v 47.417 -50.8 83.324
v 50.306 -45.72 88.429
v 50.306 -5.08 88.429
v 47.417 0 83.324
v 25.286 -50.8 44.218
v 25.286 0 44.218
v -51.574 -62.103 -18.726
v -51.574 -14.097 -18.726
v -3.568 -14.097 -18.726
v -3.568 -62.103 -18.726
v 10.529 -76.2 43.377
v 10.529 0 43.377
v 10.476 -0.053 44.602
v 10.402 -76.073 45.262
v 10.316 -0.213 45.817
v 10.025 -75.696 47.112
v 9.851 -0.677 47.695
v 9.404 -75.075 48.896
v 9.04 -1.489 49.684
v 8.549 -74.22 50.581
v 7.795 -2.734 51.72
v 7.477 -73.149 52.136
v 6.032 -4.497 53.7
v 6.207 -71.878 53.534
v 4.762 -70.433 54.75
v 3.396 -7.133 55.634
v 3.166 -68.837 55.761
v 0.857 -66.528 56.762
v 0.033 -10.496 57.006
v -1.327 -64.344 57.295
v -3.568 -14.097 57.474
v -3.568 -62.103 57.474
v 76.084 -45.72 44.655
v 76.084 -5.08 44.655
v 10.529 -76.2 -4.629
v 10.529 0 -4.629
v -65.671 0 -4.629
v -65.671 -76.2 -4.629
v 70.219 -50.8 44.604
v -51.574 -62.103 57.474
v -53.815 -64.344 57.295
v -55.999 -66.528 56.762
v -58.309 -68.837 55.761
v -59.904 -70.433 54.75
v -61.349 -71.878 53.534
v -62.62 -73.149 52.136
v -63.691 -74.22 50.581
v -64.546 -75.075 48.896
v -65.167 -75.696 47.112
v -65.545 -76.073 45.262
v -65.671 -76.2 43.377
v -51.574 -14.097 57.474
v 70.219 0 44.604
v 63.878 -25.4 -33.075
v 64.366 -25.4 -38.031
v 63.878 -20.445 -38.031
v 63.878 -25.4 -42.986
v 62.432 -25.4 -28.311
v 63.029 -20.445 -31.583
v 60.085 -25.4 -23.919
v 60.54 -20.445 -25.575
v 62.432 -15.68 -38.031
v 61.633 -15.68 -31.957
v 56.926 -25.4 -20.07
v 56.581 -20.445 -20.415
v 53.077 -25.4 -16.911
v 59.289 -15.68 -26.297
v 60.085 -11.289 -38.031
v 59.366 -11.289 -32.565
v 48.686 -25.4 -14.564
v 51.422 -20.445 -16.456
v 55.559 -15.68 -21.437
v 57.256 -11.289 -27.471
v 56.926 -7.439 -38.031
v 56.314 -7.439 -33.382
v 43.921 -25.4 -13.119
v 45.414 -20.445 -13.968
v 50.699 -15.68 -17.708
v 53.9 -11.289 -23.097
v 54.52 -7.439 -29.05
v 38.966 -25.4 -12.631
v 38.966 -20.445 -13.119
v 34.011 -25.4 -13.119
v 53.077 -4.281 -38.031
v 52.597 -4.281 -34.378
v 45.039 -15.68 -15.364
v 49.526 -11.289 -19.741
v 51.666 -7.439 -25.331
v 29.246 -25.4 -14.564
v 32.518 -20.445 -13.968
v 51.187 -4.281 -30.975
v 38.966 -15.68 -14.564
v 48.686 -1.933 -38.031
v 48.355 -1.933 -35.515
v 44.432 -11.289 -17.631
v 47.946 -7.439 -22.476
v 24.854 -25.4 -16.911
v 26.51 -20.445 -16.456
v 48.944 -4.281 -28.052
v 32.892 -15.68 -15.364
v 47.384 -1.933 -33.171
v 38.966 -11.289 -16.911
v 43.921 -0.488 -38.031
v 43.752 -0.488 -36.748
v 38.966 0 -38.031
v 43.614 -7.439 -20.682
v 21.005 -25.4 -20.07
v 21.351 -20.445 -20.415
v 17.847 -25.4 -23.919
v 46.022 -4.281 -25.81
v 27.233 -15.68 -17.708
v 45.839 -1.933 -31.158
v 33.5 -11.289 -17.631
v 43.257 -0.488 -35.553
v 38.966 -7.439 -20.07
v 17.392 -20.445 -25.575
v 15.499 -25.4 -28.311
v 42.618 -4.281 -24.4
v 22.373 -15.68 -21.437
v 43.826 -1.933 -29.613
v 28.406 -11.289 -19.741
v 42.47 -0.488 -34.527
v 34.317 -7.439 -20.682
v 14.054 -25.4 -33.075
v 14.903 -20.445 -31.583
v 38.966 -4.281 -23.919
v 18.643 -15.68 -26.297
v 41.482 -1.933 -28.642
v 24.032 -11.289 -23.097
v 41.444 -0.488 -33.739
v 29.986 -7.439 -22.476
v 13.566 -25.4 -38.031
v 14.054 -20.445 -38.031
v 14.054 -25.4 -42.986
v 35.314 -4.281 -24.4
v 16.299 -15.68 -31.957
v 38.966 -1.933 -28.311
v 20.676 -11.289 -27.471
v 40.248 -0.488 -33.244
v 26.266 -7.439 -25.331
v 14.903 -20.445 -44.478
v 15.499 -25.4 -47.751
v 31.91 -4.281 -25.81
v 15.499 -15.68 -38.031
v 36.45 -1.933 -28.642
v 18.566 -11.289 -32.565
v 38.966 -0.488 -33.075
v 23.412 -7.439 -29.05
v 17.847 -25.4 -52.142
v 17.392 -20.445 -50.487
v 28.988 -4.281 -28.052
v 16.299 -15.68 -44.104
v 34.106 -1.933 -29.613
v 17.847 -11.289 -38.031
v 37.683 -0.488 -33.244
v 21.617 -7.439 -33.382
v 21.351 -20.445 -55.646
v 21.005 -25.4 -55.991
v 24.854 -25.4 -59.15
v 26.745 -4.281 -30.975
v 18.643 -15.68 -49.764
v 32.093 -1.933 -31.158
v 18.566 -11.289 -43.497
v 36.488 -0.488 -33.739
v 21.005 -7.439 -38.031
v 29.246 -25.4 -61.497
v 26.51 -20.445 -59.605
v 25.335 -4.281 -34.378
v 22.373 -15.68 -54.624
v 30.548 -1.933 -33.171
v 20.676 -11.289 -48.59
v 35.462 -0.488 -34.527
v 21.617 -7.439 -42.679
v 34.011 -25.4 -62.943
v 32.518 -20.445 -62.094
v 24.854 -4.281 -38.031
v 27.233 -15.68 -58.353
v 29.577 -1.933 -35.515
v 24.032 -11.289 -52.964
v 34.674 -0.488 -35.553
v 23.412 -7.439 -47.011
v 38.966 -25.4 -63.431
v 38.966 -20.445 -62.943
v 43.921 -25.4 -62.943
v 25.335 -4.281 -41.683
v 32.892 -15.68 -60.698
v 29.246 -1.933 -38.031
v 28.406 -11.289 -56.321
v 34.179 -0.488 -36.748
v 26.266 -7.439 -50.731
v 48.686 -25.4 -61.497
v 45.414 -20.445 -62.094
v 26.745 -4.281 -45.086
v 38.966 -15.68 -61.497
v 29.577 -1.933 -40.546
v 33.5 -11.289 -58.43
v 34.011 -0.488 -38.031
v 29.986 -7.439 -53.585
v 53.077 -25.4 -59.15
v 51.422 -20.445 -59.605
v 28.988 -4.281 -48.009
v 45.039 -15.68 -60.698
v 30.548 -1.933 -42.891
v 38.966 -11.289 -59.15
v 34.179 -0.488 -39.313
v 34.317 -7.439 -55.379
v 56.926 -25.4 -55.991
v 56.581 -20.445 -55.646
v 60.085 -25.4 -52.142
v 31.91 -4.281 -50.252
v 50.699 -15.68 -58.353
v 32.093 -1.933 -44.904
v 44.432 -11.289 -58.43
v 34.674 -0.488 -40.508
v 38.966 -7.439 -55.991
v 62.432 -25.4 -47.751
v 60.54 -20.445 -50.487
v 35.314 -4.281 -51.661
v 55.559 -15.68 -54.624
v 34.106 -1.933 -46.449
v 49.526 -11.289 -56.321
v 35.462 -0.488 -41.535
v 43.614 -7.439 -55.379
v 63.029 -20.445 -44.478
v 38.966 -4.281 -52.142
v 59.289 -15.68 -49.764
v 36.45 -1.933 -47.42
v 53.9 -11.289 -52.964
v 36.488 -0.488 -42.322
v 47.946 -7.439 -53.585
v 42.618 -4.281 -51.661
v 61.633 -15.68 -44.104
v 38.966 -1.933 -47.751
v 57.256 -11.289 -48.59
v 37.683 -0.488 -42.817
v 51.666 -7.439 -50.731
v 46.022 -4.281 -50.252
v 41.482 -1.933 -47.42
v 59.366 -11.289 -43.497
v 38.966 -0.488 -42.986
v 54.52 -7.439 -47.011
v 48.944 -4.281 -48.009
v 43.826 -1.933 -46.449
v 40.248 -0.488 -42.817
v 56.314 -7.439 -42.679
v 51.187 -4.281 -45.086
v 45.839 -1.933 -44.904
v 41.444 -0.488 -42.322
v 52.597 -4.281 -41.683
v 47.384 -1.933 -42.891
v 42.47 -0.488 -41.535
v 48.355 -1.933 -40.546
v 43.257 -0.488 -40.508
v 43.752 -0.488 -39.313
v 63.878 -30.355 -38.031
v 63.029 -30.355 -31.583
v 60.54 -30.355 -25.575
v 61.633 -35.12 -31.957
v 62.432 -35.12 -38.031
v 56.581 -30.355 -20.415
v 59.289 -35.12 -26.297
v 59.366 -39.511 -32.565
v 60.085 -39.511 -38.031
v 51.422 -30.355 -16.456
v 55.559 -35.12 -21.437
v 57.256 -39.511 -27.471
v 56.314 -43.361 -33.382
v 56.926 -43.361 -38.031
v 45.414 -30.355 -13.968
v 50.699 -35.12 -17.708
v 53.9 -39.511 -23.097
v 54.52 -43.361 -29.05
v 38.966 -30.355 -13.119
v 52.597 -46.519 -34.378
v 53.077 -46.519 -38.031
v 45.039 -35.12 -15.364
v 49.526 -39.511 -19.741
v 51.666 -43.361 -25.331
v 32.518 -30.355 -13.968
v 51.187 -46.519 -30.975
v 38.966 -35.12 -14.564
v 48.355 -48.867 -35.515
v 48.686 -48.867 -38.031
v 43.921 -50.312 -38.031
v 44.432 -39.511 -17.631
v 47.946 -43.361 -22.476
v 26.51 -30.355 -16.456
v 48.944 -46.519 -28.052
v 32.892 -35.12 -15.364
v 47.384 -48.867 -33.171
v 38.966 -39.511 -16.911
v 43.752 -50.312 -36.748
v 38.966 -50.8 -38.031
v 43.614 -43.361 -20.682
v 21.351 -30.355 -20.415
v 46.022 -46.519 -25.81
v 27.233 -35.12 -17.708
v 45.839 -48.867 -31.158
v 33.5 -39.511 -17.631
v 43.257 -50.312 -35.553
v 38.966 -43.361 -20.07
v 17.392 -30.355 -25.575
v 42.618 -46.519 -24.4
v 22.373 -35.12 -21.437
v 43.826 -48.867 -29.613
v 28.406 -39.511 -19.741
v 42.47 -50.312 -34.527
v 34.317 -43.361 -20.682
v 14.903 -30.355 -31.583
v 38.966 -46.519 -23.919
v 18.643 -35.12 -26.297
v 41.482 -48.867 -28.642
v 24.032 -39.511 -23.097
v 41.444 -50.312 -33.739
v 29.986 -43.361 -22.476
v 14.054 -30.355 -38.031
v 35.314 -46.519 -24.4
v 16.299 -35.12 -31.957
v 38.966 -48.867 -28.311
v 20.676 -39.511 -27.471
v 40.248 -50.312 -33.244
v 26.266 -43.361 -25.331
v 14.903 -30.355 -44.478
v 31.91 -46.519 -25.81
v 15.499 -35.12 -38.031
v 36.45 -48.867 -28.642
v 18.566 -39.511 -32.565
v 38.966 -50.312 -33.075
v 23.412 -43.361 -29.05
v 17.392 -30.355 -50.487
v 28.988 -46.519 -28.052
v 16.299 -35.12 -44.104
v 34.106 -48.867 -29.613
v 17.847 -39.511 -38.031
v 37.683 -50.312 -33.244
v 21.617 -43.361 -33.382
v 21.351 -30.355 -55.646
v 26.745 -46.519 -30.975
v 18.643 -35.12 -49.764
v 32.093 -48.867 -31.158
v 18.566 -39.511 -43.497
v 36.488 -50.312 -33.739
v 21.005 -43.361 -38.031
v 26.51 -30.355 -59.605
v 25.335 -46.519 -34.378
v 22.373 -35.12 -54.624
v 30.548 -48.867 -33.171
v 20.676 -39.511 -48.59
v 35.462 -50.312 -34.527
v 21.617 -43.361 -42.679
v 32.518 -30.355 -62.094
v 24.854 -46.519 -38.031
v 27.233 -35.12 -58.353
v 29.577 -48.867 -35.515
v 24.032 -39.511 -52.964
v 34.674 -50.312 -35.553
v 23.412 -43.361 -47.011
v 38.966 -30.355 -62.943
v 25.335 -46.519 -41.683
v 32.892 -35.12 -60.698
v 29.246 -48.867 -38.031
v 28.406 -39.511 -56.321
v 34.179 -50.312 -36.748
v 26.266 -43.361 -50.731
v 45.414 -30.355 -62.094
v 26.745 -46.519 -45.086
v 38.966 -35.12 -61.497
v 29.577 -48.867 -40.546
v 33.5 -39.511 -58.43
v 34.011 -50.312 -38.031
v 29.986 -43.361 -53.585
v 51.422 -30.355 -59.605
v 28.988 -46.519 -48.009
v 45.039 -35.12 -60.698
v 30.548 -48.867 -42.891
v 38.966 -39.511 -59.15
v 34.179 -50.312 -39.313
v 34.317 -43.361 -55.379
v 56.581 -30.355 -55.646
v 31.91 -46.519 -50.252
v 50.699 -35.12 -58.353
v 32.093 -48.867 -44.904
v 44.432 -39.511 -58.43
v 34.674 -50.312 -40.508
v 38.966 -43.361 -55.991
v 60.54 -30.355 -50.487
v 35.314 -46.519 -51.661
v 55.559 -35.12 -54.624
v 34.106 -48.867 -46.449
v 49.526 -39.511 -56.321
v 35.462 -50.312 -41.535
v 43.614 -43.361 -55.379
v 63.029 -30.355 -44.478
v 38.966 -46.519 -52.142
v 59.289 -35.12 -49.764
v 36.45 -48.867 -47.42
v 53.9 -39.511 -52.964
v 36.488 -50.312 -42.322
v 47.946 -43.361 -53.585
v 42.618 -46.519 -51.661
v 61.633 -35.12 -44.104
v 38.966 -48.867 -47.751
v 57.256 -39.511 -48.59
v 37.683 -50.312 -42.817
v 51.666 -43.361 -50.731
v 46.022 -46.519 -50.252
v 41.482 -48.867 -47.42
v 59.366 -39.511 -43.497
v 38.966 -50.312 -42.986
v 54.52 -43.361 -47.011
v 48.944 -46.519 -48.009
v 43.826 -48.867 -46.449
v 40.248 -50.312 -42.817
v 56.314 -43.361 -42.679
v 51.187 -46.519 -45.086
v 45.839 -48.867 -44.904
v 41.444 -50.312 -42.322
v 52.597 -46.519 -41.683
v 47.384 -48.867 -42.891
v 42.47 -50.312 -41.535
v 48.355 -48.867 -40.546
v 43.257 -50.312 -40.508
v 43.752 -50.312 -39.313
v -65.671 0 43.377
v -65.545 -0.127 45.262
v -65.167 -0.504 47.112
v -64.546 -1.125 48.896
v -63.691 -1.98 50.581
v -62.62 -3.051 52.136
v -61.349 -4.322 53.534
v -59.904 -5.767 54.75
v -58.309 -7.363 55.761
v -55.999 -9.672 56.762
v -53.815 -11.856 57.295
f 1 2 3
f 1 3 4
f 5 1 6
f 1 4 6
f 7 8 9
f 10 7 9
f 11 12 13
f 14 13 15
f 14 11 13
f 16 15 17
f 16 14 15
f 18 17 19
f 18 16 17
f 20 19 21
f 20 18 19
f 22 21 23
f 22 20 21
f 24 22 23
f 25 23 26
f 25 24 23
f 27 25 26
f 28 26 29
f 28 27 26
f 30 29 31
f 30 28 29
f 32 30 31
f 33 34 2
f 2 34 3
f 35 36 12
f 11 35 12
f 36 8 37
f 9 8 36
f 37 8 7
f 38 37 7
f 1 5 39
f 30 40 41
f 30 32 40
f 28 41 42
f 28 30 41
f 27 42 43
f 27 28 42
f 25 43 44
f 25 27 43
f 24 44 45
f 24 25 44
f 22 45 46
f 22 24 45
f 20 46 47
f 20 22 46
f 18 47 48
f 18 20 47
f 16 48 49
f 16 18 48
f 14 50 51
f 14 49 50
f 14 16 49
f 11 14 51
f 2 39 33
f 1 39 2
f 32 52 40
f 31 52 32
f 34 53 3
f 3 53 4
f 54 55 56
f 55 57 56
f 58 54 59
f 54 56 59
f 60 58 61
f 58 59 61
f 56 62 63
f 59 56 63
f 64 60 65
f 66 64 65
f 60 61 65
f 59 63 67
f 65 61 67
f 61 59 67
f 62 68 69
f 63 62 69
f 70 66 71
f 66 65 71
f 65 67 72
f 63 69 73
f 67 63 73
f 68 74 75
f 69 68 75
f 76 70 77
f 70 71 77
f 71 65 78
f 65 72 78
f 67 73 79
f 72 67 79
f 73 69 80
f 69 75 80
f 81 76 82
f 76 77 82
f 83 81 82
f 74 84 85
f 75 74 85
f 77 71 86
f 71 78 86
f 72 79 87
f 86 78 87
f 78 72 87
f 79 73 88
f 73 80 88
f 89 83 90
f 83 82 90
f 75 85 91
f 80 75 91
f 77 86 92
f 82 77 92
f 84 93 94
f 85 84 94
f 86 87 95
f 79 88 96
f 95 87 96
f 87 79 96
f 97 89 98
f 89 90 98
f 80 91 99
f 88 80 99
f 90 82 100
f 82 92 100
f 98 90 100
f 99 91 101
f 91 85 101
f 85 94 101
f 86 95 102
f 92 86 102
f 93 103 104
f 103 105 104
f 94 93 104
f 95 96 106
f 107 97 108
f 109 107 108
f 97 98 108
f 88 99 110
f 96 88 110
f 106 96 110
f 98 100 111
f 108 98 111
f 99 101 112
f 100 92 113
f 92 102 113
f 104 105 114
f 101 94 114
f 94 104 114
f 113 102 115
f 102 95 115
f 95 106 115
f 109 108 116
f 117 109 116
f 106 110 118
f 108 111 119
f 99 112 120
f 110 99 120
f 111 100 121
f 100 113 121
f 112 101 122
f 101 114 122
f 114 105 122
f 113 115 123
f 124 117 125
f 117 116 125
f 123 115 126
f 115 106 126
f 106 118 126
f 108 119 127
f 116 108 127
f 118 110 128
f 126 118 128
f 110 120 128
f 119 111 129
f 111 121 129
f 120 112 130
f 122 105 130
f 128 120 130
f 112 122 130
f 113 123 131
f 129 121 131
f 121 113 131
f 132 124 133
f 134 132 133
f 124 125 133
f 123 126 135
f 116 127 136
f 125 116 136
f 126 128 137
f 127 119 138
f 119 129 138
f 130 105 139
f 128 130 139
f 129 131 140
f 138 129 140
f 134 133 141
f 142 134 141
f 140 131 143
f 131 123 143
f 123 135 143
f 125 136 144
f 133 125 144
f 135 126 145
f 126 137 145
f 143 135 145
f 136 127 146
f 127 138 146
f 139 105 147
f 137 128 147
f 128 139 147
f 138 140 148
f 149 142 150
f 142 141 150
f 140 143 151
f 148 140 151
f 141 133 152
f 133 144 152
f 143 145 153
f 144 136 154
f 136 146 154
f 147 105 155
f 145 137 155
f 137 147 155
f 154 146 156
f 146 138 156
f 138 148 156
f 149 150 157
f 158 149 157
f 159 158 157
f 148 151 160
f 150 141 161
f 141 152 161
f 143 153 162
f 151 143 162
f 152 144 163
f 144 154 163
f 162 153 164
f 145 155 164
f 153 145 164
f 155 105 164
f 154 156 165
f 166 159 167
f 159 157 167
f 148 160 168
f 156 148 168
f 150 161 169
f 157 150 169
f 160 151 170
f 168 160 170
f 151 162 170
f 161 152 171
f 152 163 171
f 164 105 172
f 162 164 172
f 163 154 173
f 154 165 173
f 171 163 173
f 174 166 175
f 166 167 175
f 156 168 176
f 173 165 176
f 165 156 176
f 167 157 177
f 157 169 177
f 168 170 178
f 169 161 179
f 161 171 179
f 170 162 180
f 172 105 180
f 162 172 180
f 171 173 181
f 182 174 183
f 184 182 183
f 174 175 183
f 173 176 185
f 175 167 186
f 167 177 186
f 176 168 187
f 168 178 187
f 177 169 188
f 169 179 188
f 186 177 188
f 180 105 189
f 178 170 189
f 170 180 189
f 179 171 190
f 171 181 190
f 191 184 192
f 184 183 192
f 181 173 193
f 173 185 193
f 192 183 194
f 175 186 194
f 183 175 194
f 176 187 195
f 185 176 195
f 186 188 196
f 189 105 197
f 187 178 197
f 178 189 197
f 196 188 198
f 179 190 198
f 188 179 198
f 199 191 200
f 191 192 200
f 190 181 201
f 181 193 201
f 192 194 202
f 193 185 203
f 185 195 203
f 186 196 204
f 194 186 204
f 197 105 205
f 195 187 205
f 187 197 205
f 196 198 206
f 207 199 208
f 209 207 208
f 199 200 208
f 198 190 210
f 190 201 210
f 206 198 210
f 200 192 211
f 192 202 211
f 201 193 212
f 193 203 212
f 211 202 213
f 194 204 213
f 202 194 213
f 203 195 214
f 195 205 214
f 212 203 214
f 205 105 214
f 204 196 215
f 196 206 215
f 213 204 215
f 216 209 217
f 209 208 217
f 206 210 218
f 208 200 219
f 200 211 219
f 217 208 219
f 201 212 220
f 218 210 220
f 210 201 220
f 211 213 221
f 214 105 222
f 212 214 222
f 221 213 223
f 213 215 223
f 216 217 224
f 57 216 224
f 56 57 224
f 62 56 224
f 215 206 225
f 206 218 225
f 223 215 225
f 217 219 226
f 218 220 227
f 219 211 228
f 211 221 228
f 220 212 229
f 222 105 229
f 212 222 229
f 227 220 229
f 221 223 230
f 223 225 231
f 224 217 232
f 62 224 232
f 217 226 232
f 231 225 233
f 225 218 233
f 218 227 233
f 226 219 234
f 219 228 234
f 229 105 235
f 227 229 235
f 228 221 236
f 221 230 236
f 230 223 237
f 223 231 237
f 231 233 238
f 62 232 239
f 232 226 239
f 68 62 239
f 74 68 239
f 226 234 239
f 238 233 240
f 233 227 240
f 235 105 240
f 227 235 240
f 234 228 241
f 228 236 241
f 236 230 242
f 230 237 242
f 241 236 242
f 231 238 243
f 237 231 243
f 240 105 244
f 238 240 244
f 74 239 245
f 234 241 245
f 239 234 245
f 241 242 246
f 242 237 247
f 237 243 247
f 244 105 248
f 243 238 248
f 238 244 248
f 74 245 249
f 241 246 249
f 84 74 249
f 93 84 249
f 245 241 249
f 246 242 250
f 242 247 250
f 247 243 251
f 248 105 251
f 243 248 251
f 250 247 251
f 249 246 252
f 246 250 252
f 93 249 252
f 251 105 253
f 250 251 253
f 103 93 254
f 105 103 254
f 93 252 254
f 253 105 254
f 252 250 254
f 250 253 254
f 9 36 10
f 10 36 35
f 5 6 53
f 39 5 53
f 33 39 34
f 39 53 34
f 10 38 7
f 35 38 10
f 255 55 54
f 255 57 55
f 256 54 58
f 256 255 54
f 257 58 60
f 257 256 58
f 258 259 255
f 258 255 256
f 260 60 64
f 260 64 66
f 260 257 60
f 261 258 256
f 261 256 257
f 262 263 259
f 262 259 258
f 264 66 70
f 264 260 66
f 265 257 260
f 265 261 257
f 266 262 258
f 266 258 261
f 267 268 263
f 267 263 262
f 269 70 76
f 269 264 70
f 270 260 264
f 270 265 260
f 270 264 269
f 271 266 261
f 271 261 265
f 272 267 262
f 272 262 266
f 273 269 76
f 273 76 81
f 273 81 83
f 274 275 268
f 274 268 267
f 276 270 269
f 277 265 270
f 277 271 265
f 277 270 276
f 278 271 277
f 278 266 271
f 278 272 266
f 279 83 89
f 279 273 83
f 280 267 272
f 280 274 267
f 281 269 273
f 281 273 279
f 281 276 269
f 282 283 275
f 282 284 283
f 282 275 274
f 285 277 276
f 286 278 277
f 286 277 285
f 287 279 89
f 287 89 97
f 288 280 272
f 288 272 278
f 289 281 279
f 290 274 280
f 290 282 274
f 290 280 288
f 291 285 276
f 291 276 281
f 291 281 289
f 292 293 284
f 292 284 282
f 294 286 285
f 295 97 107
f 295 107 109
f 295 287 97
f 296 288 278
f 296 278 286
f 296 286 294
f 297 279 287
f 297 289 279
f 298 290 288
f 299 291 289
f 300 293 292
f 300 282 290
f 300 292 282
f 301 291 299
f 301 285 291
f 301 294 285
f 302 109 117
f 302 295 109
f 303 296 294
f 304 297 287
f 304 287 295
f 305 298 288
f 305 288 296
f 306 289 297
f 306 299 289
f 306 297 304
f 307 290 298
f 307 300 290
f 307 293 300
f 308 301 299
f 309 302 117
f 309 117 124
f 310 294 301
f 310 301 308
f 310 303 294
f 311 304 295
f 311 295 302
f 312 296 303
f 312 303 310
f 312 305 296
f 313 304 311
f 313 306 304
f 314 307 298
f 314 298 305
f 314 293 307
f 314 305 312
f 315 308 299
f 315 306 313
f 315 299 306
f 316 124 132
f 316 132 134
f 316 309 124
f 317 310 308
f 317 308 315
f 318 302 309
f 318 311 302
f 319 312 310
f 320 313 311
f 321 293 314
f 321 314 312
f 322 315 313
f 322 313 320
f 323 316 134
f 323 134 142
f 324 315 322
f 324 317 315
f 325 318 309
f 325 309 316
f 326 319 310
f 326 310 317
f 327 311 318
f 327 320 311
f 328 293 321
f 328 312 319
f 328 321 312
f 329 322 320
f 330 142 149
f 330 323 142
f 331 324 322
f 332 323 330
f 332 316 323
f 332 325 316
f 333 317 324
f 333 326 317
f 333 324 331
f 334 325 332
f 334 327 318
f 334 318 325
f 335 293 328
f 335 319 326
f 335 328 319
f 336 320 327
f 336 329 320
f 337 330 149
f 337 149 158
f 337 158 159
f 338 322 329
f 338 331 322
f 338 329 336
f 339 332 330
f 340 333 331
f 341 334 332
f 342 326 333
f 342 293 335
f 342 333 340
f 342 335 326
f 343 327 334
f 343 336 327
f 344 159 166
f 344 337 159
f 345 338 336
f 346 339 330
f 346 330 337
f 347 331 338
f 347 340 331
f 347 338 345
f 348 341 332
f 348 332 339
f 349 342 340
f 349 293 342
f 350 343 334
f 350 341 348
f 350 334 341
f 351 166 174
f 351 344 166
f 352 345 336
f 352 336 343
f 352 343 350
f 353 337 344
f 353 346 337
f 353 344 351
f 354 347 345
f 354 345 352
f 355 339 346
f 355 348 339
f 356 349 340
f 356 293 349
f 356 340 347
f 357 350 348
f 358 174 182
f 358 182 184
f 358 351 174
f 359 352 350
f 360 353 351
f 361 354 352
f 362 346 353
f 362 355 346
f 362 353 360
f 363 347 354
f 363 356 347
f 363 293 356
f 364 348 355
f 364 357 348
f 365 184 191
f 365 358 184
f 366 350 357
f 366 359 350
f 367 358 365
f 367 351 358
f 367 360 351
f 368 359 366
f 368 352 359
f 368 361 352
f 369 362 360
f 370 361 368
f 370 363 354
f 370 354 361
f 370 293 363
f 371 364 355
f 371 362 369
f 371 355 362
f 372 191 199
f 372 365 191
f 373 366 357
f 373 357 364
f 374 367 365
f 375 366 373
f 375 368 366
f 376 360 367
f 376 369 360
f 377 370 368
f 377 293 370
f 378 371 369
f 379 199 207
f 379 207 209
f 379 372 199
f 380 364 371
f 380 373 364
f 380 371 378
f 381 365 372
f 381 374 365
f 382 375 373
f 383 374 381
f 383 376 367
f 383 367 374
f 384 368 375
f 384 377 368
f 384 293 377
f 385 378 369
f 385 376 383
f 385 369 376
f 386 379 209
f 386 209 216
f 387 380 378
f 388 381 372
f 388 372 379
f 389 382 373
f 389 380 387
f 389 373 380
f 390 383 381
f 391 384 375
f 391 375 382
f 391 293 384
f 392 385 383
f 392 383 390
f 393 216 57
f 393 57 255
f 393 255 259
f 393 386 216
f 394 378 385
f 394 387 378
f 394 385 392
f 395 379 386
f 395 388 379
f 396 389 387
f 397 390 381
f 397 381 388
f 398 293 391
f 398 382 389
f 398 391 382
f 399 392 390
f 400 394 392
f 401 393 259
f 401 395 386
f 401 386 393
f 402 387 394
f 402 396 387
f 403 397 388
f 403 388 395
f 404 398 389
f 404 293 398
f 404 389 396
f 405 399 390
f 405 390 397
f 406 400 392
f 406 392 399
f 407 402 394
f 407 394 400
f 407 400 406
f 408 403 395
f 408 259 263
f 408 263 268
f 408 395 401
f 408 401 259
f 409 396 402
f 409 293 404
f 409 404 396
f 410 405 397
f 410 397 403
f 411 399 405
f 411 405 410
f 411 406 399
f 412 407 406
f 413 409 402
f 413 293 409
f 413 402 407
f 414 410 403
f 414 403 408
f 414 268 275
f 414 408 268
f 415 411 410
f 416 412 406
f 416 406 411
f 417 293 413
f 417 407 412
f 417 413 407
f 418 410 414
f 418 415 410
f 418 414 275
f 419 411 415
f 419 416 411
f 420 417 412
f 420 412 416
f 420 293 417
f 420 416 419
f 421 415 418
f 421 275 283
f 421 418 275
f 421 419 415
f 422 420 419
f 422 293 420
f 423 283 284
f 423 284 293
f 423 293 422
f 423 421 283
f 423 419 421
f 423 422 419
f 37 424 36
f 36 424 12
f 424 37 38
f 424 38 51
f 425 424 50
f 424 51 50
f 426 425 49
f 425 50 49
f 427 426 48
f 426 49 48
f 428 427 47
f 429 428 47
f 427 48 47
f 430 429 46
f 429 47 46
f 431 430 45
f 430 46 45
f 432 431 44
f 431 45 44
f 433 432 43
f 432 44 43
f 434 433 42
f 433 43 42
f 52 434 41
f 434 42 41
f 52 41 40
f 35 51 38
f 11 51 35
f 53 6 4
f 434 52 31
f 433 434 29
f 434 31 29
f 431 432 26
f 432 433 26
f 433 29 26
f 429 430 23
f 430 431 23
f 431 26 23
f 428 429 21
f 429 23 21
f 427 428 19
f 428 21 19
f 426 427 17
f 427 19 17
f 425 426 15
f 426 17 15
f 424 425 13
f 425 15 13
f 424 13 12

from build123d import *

# Parameters (mm, degrees)
F0_W     = 76.2
F0_H     = 76.2
F1_DEPTH = 76.2
F2_R     = 14.097
F3_SIZE  = 14.097
F4_R     = 25.4
F5_DEPTH = 50.8
F6_R     = 25.39999
F8_DEPTH = 50.8
F9_SIZE2 = 5.08
F9_SIZE  = 5.08


# Not quite as in the source:
# - a fillet or chamfer is up to 0.001 mm smaller than in the source, because OpenCascade refuses the exact size


with BuildPart() as f1:
    # F0 (on Front) → F1 (new body)
    with BuildSketch(Plane.XZ):
        with Locations((-27.5710467249, 19.3739583973)):
            Rectangle(F0_W, F0_H)
    extrude(amount=F1_DEPTH)

    # F2
    f2_edges = [f1.edges().sort_by_distance(p)[0] for p in [
        (-65.671047, -38.1, 57.473958),
        (-27.571047, 0, 57.473958),
        (10.528953, -38.1, 57.473958),
        (-27.571047, -76.2, 57.473958),
    ]]
    fillet(f2_edges, radius=F2_R)

    # F3
    f3_edges = [f1.edges().sort_by_distance(p)[0] for p in [
        (-65.671047, -38.1, -18.726042),
        (-27.571047, -76.2, -18.726042),
        (10.528953, -38.1, -18.726042),
        (-27.571047, 0, -18.726042),
    ]]
    chamfer(f3_edges, length=F3_SIZE)


with BuildPart() as f5:
    # F4 (on Front) → F5 (new body)
    with BuildSketch(Plane.XZ):
        with Locations((38.9659069479, -38.0307249725)):
            Circle(F4_R)
    extrude(amount=F5_DEPTH)

    # F6 (radius 25.4 in the source; OpenCascade refuses exactly that, so slightly less here)
    f6_edges = [f5.edges().sort_by_distance(p)[0] for p in [
        (13.565907, -50.8, -38.030725),
        (13.565907, 0, -38.030725),
    ]]
    fillet(f6_edges, radius=F6_R)


with BuildPart() as f8:
    # F7 (on Front) → F8 (new body)
    with BuildSketch(Plane.XZ):
        Polygon((76.0843477927, 44.654974036), (50.3064604832, 88.4287164607), (25.2862311795, 44.2175399825), align=None)
    extrude(amount=F8_DEPTH)

    # F9
    f9_edges = [f8.edges().sort_by_distance(p)[0] for p in [
        (63.195404, 0, 66.541845),
        (63.195404, -50.8, 66.541845),
    ]]
    chamfer(f9_edges, length=F9_SIZE, length2=F9_SIZE2)


solid = Compound([f1.part, f5.part, f8.part])
